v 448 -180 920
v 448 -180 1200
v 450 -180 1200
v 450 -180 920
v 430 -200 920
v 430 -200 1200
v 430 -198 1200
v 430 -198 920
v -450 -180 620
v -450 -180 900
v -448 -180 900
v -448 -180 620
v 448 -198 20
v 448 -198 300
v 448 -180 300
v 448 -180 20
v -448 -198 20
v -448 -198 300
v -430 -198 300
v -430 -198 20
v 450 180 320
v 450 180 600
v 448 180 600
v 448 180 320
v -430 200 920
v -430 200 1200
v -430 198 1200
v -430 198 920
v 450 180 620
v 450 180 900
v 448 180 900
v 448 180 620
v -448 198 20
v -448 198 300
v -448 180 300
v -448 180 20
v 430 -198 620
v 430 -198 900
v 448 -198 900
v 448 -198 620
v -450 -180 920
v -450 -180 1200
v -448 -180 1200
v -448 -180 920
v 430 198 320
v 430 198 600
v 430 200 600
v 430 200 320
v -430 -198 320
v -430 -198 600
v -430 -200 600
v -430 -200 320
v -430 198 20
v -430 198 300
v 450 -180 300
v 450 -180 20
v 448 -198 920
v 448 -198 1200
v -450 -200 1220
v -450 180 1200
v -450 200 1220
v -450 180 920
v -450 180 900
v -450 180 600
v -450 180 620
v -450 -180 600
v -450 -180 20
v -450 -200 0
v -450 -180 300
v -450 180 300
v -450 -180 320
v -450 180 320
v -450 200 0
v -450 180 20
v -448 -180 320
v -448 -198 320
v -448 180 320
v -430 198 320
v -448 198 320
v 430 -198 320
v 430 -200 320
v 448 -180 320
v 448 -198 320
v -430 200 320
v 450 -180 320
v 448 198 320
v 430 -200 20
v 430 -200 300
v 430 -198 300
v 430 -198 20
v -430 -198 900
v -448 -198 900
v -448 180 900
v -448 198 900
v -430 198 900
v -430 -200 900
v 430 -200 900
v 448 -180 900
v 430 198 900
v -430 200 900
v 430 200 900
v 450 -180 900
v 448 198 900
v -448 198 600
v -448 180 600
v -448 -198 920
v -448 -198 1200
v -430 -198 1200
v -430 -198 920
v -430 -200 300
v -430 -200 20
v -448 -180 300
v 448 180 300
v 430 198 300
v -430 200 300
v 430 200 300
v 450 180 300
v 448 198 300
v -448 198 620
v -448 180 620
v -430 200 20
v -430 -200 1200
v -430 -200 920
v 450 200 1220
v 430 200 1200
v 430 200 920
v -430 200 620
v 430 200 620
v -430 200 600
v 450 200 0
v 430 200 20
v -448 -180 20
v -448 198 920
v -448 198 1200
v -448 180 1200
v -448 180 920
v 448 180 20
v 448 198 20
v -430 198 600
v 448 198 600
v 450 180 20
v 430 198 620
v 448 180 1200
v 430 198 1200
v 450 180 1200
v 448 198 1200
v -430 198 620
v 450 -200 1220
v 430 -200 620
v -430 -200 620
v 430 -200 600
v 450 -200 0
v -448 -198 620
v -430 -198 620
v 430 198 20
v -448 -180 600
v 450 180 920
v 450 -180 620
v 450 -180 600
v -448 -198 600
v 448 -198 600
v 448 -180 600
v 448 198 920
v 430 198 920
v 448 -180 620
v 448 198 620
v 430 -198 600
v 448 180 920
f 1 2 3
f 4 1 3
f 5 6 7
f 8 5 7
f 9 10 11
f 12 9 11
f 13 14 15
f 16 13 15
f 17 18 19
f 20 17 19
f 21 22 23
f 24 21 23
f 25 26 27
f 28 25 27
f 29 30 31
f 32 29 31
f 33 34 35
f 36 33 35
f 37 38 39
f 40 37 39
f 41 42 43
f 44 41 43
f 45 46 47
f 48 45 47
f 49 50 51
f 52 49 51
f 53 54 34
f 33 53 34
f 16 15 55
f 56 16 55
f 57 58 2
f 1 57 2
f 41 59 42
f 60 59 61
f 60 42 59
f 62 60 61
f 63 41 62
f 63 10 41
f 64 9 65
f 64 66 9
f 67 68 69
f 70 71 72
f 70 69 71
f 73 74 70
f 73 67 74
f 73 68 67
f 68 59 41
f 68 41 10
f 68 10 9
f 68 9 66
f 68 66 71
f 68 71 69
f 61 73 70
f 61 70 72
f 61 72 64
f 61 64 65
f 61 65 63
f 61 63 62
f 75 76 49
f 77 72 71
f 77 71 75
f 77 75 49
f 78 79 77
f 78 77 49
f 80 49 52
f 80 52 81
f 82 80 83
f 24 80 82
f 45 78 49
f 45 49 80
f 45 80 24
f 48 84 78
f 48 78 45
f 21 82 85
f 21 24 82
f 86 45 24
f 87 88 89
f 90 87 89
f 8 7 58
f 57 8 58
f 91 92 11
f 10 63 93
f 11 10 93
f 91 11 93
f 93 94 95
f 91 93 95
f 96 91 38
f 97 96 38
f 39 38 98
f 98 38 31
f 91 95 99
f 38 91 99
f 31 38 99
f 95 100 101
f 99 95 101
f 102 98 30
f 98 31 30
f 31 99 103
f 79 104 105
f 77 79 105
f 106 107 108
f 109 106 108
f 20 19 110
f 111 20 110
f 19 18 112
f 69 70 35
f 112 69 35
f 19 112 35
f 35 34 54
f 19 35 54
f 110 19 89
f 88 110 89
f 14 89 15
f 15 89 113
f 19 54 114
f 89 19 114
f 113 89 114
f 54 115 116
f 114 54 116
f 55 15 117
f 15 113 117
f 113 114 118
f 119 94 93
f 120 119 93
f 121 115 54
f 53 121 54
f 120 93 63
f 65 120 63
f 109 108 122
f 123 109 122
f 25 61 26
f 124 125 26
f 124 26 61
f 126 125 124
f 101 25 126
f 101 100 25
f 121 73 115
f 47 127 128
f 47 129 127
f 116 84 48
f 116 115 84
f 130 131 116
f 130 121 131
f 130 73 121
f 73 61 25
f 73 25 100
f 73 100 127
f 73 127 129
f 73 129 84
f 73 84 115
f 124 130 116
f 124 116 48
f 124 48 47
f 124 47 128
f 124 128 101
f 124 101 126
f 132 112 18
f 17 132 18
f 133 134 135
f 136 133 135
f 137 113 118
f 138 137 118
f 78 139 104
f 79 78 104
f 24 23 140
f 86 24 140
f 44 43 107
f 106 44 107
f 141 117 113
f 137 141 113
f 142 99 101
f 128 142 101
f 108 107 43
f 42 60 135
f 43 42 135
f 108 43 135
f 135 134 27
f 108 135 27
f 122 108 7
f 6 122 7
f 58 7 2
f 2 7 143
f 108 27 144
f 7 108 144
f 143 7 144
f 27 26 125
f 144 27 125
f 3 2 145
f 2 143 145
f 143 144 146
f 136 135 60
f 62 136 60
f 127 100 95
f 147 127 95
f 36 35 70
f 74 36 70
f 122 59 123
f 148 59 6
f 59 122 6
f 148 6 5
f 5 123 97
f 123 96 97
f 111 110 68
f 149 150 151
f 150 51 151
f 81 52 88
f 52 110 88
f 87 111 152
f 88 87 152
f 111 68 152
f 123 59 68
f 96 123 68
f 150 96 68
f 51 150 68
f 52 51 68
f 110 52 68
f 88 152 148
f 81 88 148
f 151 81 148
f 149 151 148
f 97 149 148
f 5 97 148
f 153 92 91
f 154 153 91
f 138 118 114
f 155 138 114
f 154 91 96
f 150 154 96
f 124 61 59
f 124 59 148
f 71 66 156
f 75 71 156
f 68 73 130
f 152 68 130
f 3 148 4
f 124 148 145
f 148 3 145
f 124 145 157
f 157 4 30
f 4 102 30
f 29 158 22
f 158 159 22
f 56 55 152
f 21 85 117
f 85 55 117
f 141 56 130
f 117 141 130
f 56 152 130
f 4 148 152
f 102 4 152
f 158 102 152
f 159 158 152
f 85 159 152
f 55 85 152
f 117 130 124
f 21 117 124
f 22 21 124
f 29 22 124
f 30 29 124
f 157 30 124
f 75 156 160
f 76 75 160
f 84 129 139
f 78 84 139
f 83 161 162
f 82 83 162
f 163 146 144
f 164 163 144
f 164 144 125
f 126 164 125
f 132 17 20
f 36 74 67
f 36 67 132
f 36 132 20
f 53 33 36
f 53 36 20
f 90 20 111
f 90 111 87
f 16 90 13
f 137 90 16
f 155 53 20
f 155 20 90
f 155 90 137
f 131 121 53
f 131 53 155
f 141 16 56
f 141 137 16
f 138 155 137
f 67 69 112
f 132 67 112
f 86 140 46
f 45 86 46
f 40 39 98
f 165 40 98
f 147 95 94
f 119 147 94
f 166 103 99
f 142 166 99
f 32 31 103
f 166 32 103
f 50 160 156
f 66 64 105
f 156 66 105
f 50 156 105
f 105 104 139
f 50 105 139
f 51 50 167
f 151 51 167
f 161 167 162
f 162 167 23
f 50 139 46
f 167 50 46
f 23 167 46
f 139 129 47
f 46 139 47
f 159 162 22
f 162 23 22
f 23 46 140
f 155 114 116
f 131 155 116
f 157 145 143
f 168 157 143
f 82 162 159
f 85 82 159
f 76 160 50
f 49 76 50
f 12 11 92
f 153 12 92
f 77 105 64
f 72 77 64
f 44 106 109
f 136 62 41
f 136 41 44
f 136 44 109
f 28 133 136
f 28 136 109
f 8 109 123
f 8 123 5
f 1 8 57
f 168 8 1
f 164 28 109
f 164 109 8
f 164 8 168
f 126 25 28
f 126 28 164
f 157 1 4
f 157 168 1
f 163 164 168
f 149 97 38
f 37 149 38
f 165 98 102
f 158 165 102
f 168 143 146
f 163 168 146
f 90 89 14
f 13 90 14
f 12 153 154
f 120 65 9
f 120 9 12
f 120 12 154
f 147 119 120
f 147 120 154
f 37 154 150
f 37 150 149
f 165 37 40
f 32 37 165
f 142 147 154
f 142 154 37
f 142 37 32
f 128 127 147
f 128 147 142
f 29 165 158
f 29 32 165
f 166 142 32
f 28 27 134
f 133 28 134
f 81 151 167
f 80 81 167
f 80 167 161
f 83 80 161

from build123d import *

# Parameters (mm, degrees)
F4_W      = 900
F4_H      = 400
F6_DEPTH  = 1220
F7_DEPTH  = 280
F11_DEPTH = 280
F12_DEPTH = 280
F13_DEPTH = 280


with BuildPart() as f6:
    # F4 (on Top) → F6 (new body)
    with BuildSketch(Plane.XY):
        Rectangle(F4_W, F4_H)
    extrude(amount=F6_DEPTH)

    # F5 (on offset) → F7 (cut)
    with BuildSketch(Plane.XY.offset(300)):
        Polygon((-430, 198), (-448, 198), (-448, 180), (-450, 180), (-450, -180), (-448, -180), (-448, -198), (-430, -198), (-430, -200), (430, -200), (430, -198), (448, -198), (448, -180), (450, -180), (450, 180), (448, 180), (448, 198), (430, 198), (430, 200), (-430, 200), align=None)
    extrude(amount=-F7_DEPTH, mode=Mode.SUBTRACT)

    # F8 (on offset) → F11 (cut)
    with BuildSketch(Plane.XY.offset(600)):
        Polygon((-430, 198), (-448, 198), (-448, 180), (-450, 180), (-450, -180), (-448, -180), (-448, -198), (-430, -198), (-430, -200), (430, -200), (430, -198), (448, -198), (448, -180), (450, -180), (450, 180), (448, 180), (448, 198), (430, 198), (430, 200), (-430, 200), align=None)
    extrude(amount=-F11_DEPTH, mode=Mode.SUBTRACT)

    # F9 (on offset) → F12 (cut)
    with BuildSketch(Plane.XY.offset(900)):
        Polygon((-430, 198), (-448, 198), (-448, 180), (-450, 180), (-450, -180), (-448, -180), (-448, -198), (-430, -198), (-430, -200), (430, -200), (430, -198), (448, -198), (448, -180), (450, -180), (450, 180), (448, 180), (448, 198), (430, 198), (430, 200), (-430, 200), align=None)
    extrude(amount=-F12_DEPTH, mode=Mode.SUBTRACT)

    # F10 (on offset) → F13 (cut)
    with BuildSketch(Plane.XY.offset(1200)):
        Polygon((-430, 198), (-448, 198), (-448, 180), (-450, 180), (-450, -180), (-448, -180), (-448, -198), (-430, -198), (-430, -200), (430, -200), (430, -198), (448, -198), (448, -180), (450, -180), (450, 180), (448, 180), (448, 198), (430, 198), (430, 200), (-430, 200), align=None)
    extrude(amount=-F13_DEPTH, mode=Mode.SUBTRACT)


solid = f6.part
